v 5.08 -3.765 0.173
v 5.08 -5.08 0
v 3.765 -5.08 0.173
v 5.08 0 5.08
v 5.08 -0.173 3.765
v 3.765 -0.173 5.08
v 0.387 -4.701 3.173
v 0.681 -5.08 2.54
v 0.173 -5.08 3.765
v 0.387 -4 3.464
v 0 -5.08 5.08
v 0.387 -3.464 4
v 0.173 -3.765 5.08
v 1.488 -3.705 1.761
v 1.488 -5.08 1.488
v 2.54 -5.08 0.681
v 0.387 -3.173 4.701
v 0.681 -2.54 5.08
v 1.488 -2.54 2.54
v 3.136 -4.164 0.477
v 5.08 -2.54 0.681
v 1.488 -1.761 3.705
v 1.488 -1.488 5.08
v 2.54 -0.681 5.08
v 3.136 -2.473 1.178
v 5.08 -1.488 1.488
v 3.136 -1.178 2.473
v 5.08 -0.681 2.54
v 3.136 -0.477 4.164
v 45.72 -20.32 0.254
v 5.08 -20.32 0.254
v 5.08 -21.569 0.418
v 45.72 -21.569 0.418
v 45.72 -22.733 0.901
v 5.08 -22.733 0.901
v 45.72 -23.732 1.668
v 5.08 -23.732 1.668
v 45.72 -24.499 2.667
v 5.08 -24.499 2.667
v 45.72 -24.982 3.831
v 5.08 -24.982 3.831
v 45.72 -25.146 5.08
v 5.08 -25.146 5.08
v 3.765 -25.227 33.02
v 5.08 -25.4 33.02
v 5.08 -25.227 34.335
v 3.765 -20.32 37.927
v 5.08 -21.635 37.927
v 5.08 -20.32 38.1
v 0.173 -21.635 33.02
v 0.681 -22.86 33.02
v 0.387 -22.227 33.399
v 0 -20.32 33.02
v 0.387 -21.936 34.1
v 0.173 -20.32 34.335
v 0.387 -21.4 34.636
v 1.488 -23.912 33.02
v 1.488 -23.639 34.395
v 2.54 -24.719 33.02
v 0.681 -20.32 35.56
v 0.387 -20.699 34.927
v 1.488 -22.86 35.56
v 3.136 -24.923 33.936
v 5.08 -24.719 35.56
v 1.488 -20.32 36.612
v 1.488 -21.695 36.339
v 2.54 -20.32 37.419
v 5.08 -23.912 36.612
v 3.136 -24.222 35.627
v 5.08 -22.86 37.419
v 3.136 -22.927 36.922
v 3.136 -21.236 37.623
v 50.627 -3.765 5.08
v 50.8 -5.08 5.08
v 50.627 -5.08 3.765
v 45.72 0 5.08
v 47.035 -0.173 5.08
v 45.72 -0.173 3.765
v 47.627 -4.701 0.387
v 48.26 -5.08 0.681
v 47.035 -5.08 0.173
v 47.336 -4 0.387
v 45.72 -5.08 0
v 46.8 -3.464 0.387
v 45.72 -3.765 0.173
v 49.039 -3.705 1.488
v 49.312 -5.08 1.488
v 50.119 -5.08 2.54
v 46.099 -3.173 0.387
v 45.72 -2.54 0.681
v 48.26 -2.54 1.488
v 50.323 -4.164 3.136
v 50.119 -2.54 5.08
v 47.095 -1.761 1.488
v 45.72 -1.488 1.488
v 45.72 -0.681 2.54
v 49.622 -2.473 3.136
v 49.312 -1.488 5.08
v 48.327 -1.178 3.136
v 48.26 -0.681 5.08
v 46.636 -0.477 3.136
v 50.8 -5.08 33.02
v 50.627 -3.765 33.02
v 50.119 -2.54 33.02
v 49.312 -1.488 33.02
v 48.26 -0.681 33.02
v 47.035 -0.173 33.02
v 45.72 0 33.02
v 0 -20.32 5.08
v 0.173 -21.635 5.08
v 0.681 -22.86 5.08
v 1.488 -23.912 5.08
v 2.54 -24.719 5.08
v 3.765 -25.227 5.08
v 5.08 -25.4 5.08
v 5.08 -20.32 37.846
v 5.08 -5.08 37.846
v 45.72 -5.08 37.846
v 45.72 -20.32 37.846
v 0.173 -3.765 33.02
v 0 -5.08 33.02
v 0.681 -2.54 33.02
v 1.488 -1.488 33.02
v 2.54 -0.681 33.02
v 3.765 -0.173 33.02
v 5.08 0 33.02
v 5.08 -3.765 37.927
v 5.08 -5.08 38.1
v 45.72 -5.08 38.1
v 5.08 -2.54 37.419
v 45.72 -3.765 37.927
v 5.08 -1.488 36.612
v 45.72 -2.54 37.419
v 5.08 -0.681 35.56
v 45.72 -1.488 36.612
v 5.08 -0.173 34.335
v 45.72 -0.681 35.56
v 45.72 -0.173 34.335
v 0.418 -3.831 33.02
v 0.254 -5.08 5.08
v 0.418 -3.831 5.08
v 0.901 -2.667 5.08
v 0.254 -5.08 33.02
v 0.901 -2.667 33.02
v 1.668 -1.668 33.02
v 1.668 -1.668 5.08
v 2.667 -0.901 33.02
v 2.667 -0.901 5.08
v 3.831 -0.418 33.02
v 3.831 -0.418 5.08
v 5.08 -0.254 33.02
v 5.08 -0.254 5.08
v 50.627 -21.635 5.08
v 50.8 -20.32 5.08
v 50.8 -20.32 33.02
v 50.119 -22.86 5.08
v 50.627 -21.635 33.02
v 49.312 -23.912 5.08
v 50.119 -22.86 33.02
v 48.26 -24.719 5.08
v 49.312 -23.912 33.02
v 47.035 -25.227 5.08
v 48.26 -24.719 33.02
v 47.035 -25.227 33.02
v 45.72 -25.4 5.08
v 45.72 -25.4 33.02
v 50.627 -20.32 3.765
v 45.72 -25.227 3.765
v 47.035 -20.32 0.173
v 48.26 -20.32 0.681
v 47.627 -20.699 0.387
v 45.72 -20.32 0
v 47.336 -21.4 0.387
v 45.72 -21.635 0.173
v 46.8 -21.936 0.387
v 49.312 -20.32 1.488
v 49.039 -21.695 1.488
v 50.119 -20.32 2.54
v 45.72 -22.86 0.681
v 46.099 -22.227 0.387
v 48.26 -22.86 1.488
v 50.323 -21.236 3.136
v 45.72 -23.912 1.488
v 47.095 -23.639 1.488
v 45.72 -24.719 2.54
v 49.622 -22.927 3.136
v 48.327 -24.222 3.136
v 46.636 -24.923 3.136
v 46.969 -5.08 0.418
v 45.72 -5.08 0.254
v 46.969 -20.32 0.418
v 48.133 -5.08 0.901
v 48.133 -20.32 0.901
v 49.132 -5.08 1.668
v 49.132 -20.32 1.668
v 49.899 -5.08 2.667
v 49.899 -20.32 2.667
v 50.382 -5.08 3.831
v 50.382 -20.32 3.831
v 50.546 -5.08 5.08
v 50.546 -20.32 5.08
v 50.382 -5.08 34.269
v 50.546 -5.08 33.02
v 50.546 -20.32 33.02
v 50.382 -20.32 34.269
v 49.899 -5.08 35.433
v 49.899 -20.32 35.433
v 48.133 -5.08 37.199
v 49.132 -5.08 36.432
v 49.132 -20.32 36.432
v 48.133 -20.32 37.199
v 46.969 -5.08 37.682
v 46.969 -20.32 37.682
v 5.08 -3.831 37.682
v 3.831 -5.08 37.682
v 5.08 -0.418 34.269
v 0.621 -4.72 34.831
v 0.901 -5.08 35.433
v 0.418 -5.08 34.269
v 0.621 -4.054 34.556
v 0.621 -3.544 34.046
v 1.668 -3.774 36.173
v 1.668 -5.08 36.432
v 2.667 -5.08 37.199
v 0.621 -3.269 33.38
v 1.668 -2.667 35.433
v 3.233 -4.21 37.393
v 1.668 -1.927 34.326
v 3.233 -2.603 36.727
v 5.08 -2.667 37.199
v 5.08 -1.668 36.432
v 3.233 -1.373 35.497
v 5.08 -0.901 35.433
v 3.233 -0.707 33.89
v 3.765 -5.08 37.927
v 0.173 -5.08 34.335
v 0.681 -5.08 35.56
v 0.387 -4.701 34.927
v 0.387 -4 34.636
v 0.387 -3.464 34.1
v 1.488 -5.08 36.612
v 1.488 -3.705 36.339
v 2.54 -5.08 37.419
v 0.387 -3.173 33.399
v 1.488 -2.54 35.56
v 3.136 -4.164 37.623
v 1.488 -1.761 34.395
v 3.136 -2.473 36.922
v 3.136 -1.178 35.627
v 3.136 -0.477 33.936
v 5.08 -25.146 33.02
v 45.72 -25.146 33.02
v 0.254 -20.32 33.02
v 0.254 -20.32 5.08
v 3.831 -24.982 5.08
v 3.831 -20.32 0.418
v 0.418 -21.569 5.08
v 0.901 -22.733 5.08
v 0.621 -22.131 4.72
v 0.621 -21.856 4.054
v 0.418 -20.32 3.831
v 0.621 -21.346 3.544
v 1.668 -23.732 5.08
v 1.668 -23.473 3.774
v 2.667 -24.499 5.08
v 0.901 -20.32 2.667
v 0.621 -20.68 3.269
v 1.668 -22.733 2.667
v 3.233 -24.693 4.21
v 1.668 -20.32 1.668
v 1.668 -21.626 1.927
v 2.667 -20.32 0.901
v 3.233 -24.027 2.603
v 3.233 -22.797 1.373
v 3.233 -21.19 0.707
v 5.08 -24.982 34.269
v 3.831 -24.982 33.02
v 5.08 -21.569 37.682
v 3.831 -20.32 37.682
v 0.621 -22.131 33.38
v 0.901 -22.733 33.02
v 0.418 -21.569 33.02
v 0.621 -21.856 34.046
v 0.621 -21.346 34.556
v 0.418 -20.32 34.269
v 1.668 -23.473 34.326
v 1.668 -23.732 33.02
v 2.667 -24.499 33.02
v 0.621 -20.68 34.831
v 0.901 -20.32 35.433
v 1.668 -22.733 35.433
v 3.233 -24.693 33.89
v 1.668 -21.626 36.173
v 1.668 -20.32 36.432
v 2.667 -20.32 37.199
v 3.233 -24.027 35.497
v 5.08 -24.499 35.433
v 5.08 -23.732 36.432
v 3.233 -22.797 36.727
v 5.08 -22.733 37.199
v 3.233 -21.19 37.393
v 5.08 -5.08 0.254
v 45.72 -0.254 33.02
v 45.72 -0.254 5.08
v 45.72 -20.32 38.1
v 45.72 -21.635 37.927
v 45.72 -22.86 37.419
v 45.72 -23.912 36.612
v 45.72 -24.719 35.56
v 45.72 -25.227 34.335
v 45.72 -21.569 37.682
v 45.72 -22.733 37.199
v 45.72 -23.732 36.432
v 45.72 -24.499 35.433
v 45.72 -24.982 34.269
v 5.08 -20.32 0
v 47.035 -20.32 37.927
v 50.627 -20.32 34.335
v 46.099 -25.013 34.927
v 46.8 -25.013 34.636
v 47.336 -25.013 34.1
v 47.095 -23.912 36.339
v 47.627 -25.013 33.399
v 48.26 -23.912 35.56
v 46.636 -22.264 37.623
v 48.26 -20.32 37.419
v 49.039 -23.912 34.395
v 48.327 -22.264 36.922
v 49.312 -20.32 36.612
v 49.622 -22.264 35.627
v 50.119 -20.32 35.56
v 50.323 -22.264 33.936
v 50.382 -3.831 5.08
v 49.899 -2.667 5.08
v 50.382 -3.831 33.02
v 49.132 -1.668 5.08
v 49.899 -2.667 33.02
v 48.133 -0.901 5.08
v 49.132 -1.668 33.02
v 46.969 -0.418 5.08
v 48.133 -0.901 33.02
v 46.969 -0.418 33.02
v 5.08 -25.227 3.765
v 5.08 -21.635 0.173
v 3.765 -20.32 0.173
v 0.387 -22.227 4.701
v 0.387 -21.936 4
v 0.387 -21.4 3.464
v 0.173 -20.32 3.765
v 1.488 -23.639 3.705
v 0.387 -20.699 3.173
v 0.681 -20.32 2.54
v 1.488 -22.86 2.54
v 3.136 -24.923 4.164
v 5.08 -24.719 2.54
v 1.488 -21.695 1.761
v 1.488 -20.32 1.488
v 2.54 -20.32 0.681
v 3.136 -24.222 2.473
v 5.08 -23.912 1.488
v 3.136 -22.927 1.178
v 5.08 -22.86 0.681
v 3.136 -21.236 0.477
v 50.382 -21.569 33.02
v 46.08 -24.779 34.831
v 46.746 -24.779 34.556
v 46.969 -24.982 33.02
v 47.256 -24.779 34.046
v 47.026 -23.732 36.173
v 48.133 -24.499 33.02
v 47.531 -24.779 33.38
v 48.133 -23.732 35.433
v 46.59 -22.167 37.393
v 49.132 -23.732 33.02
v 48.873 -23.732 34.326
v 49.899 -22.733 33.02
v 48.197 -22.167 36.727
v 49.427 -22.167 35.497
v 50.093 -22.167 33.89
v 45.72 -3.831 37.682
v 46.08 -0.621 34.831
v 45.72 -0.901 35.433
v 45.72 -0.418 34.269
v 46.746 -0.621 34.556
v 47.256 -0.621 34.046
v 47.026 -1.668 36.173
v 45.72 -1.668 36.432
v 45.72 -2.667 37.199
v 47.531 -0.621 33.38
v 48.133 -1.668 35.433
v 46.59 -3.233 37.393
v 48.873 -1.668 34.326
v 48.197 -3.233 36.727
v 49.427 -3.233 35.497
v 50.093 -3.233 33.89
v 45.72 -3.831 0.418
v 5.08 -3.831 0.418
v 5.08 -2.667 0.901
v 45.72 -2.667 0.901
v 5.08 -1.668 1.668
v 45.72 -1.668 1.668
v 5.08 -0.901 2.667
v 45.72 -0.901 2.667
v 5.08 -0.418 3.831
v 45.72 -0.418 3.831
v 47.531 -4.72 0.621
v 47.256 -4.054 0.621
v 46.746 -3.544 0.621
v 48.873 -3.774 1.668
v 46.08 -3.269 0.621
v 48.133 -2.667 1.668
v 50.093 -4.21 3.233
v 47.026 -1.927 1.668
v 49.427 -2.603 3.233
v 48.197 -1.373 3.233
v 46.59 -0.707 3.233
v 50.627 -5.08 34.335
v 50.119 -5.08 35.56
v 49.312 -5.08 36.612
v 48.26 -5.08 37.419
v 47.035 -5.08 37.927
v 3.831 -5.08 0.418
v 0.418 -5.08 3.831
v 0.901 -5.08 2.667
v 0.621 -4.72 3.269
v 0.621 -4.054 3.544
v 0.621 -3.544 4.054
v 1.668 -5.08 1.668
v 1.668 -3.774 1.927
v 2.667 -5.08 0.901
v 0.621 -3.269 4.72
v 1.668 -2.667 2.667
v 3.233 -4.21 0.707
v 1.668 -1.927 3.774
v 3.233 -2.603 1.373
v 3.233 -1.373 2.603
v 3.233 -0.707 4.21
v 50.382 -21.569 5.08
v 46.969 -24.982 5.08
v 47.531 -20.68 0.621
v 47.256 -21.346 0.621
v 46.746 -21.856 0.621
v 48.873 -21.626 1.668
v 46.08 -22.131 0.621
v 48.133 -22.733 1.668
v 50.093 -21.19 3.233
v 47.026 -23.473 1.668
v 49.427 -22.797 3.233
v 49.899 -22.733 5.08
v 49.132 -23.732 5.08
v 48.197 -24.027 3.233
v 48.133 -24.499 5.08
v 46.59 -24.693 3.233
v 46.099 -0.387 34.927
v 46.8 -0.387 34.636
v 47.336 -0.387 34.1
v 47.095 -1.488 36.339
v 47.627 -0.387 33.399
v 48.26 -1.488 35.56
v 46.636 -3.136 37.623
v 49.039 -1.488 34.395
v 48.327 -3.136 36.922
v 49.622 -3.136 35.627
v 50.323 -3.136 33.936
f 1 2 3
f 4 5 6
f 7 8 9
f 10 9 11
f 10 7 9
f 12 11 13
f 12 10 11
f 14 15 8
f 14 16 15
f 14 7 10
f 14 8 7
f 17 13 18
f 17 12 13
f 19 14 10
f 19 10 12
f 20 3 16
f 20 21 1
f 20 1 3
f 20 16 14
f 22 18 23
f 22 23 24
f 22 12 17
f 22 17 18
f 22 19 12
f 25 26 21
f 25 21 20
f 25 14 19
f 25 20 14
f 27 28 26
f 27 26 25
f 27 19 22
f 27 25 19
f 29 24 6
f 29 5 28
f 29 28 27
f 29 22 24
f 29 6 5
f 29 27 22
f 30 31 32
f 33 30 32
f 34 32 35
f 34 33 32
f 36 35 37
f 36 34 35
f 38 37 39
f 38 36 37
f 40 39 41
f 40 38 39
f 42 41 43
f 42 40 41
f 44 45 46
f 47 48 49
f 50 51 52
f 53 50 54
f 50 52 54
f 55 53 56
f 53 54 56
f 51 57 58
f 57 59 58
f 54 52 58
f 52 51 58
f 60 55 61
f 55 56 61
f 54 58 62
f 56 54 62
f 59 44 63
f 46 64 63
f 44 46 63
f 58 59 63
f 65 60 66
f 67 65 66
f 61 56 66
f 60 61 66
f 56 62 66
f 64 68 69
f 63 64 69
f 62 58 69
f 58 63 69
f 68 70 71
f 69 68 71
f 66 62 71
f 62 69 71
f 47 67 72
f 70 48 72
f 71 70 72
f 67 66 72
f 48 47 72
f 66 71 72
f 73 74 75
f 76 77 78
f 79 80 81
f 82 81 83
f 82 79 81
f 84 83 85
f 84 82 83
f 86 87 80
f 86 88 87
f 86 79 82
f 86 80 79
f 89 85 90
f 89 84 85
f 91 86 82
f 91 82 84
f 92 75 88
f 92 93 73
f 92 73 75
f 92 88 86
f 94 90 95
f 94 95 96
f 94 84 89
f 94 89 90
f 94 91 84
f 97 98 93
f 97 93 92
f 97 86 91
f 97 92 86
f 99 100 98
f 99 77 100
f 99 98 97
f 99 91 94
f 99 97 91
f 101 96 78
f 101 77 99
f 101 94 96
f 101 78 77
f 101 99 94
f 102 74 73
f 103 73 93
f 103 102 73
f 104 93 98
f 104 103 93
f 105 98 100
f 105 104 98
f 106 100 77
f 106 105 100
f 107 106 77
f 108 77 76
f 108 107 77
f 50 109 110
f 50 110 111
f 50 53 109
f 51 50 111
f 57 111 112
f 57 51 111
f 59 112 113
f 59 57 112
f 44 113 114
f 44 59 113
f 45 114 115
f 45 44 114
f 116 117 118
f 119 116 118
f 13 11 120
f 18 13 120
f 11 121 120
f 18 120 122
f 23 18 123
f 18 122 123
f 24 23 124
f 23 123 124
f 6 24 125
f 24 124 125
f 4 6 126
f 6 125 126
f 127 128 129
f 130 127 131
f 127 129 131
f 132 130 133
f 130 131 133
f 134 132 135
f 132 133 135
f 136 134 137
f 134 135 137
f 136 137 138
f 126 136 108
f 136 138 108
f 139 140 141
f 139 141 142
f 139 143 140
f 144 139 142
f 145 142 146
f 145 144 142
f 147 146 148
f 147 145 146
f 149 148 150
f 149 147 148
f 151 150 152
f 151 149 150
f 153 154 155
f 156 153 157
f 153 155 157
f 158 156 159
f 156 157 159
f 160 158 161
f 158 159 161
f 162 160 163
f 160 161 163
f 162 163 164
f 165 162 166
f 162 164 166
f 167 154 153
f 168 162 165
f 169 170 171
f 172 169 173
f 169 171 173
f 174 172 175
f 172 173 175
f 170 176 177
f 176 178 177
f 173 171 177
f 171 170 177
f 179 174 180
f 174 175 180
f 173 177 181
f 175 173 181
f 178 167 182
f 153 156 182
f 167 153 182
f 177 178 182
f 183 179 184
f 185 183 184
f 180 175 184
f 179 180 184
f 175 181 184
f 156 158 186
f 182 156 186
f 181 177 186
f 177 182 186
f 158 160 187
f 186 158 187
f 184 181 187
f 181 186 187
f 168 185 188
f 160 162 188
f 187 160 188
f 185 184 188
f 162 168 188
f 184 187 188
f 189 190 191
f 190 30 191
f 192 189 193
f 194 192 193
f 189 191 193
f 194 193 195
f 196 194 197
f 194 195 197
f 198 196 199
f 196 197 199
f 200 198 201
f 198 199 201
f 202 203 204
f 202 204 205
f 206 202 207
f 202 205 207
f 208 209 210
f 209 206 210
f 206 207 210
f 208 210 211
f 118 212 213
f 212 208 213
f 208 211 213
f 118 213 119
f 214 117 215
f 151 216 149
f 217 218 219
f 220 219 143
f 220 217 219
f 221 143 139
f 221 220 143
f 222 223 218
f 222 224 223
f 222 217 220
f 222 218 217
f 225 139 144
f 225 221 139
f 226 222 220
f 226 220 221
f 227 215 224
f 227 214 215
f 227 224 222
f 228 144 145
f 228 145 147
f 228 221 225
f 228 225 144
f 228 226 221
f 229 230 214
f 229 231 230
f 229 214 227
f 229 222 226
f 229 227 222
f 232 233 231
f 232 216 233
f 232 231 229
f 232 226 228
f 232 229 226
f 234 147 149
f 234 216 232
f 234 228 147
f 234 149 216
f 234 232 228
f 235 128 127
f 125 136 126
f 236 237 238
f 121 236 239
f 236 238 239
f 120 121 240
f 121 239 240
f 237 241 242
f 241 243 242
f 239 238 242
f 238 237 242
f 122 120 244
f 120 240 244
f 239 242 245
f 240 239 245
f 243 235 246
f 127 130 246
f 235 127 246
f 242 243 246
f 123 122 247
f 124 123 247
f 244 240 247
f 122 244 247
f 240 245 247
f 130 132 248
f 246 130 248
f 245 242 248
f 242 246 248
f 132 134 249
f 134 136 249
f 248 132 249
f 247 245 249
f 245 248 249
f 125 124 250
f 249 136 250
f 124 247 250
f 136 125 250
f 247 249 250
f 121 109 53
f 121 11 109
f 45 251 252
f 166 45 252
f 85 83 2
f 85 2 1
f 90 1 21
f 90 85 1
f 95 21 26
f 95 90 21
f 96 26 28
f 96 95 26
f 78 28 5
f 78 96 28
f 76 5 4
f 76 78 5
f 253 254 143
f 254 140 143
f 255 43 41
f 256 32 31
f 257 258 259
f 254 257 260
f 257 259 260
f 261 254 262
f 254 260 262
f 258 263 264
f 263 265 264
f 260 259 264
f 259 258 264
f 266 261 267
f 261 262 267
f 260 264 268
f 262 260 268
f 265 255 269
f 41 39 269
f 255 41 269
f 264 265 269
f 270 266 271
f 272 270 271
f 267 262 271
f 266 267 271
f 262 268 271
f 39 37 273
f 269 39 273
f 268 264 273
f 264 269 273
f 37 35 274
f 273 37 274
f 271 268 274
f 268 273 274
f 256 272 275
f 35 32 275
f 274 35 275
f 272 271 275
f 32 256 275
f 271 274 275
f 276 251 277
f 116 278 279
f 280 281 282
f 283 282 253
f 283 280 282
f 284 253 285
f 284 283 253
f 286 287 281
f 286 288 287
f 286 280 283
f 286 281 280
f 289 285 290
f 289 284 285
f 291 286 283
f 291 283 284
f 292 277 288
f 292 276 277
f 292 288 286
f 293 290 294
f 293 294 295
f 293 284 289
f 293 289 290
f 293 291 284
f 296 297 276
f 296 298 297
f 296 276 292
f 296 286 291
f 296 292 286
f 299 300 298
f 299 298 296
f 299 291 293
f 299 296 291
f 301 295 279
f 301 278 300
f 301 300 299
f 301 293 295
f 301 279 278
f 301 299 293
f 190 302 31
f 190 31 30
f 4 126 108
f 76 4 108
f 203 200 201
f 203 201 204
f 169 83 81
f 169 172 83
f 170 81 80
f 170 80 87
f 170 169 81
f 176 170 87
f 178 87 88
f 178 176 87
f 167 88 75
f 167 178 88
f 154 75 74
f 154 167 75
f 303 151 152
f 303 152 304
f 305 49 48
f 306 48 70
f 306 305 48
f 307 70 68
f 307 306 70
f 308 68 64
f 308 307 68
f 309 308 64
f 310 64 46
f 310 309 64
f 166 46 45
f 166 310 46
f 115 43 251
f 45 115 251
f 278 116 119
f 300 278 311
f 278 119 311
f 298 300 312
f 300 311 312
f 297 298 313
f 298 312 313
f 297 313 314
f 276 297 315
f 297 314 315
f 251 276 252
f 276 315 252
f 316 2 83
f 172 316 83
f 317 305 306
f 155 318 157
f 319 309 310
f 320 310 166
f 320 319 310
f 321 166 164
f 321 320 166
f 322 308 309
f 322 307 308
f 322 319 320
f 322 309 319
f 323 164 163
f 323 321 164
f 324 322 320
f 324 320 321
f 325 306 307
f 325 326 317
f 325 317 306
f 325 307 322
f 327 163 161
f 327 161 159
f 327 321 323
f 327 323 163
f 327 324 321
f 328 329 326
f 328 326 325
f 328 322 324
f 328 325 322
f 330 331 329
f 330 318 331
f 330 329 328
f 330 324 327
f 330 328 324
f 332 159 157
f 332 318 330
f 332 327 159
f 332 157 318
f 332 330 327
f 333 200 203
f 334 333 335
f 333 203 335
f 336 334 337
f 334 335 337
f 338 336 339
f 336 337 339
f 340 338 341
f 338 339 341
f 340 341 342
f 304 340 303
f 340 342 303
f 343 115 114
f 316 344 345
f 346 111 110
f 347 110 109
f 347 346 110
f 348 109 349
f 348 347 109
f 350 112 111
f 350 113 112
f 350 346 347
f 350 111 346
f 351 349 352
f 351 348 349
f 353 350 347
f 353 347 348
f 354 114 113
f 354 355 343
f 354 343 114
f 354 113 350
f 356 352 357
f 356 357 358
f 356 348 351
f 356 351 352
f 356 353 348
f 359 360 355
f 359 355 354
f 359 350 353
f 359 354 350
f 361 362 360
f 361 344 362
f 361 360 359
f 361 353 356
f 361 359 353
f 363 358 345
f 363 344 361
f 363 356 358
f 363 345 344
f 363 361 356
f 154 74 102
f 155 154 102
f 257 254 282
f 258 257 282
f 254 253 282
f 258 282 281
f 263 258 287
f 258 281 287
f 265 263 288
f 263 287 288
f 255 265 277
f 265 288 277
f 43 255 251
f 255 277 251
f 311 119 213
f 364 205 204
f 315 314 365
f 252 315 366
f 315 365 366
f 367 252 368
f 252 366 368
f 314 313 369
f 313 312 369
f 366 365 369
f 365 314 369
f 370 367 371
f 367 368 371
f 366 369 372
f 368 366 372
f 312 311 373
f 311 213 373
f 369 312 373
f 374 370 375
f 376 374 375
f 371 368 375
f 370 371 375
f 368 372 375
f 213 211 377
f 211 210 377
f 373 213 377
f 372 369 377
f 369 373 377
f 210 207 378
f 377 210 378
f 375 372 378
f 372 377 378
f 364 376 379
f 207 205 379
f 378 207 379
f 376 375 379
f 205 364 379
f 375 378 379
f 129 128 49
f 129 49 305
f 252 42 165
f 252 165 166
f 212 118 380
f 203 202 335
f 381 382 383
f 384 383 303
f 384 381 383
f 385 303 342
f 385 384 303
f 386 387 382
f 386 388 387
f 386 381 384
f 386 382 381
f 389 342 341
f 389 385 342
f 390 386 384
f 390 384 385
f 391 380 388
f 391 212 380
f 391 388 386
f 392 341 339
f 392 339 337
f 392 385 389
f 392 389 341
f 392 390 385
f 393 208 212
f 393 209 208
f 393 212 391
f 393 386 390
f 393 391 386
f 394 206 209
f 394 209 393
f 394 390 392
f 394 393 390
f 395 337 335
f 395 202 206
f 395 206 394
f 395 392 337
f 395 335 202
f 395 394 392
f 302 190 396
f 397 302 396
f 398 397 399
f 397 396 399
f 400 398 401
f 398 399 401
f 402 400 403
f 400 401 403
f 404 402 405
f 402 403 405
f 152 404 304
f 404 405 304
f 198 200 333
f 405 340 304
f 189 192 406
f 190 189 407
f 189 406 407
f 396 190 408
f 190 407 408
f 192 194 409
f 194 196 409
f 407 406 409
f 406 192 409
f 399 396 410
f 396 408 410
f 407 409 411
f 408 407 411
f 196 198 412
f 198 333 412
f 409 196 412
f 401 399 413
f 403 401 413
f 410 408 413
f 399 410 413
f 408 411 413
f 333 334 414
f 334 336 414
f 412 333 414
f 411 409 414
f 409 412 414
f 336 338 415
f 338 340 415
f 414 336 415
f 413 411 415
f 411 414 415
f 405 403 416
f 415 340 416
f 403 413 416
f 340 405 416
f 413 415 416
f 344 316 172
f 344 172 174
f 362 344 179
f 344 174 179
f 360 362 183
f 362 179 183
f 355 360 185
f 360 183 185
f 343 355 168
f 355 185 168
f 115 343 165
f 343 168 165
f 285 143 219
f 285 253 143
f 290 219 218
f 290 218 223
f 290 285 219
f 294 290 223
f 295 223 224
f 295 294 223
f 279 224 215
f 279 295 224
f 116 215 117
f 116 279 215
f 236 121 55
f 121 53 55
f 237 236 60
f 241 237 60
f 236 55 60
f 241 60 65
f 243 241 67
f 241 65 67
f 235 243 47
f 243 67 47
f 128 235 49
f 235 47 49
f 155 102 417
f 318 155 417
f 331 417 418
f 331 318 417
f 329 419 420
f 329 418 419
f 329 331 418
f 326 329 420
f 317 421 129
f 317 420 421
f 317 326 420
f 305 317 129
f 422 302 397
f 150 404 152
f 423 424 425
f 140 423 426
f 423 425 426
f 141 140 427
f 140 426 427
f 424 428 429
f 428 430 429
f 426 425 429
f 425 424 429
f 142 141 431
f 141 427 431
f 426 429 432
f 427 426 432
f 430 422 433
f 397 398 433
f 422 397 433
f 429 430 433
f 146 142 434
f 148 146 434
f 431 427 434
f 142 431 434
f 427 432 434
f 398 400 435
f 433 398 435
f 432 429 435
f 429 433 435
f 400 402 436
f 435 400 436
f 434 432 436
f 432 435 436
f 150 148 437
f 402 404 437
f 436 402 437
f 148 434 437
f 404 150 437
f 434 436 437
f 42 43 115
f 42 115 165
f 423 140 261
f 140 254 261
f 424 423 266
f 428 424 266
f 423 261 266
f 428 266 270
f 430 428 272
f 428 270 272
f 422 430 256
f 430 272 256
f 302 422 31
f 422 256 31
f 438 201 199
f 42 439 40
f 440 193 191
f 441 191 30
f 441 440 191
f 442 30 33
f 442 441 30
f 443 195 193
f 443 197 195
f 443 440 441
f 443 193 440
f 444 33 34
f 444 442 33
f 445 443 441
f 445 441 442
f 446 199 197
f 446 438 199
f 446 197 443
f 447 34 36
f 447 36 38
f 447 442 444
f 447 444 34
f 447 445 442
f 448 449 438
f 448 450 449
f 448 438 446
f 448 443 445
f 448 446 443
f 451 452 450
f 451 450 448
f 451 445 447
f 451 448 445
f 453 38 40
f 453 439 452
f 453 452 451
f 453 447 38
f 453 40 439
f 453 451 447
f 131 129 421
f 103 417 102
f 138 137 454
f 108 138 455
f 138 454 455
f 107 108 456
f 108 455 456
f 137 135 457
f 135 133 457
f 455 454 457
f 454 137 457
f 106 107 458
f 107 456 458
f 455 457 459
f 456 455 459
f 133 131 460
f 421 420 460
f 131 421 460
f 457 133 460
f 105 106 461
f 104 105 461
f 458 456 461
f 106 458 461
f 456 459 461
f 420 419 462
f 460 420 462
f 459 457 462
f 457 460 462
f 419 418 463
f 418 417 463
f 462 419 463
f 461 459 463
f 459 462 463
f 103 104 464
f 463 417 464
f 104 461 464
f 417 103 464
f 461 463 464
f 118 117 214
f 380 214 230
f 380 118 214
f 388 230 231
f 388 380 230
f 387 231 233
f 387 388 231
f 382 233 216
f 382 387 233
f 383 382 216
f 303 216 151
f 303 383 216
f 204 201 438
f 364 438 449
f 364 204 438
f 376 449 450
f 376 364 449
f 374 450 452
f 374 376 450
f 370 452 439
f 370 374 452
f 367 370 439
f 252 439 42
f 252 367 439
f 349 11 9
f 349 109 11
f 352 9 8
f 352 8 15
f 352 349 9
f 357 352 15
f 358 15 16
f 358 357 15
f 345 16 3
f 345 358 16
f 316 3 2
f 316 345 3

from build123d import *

# Parameters (mm, degrees)
F0_W     = 50.8
F0_H     = 38.1
F1_DEPTH = 25.4
F2_R     = 5.08
F3_T     = -0.254


# Not quite as in the source:
# - a shell that OpenCascade refuses in one call is made with other operations: the cavity is built on its own and cut out


with BuildPart() as f1:
    # F0 (on Front) → F1 (new body)
    with BuildSketch(Plane.XZ):
        with Locations((25.4, 19.05)):
            Rectangle(F0_W, F0_H)
    extrude(amount=F1_DEPTH)

    # F2
    f2_edges = [f1.edges().sort_by_distance(p)[0] for p in [
        (50.8, -12.7, 38.1),
        (25.4, -25.4, 38.1),
        (25.4, 0, 38.1),
        (50.8, -25.4, 19.05),
        (50.8, 0, 19.05),
        (50.8, -12.7, 0),
        (25.4, -25.4, 0),
        (25.4, 0, 0),
        (0, -25.4, 19.05),
        (0, -12.7, 38.1),
        (0, -12.7, 0),
        (0, 0, 19.05),
    ]]
    fillet(f2_edges, radius=F2_R)

    # F3: a shell. OpenCascade refuses it in one call, so the cavity is built on its own and cut out:
    # the body offset inwards by the wall thickness, plus a prism from it out through each open face.
    f3_core = offset(f1.part, amount=F3_T, mode=Mode.PRIVATE)
    f3_exits = [f3_core.faces().sort_by_distance(p)[0] for p in [
        (25.4, -25.146, 19.05),
    ]]
    add(f3_core, mode=Mode.SUBTRACT)
    extrude(f3_exits, amount=-F3_T, mode=Mode.SUBTRACT)


solid = f1.part
